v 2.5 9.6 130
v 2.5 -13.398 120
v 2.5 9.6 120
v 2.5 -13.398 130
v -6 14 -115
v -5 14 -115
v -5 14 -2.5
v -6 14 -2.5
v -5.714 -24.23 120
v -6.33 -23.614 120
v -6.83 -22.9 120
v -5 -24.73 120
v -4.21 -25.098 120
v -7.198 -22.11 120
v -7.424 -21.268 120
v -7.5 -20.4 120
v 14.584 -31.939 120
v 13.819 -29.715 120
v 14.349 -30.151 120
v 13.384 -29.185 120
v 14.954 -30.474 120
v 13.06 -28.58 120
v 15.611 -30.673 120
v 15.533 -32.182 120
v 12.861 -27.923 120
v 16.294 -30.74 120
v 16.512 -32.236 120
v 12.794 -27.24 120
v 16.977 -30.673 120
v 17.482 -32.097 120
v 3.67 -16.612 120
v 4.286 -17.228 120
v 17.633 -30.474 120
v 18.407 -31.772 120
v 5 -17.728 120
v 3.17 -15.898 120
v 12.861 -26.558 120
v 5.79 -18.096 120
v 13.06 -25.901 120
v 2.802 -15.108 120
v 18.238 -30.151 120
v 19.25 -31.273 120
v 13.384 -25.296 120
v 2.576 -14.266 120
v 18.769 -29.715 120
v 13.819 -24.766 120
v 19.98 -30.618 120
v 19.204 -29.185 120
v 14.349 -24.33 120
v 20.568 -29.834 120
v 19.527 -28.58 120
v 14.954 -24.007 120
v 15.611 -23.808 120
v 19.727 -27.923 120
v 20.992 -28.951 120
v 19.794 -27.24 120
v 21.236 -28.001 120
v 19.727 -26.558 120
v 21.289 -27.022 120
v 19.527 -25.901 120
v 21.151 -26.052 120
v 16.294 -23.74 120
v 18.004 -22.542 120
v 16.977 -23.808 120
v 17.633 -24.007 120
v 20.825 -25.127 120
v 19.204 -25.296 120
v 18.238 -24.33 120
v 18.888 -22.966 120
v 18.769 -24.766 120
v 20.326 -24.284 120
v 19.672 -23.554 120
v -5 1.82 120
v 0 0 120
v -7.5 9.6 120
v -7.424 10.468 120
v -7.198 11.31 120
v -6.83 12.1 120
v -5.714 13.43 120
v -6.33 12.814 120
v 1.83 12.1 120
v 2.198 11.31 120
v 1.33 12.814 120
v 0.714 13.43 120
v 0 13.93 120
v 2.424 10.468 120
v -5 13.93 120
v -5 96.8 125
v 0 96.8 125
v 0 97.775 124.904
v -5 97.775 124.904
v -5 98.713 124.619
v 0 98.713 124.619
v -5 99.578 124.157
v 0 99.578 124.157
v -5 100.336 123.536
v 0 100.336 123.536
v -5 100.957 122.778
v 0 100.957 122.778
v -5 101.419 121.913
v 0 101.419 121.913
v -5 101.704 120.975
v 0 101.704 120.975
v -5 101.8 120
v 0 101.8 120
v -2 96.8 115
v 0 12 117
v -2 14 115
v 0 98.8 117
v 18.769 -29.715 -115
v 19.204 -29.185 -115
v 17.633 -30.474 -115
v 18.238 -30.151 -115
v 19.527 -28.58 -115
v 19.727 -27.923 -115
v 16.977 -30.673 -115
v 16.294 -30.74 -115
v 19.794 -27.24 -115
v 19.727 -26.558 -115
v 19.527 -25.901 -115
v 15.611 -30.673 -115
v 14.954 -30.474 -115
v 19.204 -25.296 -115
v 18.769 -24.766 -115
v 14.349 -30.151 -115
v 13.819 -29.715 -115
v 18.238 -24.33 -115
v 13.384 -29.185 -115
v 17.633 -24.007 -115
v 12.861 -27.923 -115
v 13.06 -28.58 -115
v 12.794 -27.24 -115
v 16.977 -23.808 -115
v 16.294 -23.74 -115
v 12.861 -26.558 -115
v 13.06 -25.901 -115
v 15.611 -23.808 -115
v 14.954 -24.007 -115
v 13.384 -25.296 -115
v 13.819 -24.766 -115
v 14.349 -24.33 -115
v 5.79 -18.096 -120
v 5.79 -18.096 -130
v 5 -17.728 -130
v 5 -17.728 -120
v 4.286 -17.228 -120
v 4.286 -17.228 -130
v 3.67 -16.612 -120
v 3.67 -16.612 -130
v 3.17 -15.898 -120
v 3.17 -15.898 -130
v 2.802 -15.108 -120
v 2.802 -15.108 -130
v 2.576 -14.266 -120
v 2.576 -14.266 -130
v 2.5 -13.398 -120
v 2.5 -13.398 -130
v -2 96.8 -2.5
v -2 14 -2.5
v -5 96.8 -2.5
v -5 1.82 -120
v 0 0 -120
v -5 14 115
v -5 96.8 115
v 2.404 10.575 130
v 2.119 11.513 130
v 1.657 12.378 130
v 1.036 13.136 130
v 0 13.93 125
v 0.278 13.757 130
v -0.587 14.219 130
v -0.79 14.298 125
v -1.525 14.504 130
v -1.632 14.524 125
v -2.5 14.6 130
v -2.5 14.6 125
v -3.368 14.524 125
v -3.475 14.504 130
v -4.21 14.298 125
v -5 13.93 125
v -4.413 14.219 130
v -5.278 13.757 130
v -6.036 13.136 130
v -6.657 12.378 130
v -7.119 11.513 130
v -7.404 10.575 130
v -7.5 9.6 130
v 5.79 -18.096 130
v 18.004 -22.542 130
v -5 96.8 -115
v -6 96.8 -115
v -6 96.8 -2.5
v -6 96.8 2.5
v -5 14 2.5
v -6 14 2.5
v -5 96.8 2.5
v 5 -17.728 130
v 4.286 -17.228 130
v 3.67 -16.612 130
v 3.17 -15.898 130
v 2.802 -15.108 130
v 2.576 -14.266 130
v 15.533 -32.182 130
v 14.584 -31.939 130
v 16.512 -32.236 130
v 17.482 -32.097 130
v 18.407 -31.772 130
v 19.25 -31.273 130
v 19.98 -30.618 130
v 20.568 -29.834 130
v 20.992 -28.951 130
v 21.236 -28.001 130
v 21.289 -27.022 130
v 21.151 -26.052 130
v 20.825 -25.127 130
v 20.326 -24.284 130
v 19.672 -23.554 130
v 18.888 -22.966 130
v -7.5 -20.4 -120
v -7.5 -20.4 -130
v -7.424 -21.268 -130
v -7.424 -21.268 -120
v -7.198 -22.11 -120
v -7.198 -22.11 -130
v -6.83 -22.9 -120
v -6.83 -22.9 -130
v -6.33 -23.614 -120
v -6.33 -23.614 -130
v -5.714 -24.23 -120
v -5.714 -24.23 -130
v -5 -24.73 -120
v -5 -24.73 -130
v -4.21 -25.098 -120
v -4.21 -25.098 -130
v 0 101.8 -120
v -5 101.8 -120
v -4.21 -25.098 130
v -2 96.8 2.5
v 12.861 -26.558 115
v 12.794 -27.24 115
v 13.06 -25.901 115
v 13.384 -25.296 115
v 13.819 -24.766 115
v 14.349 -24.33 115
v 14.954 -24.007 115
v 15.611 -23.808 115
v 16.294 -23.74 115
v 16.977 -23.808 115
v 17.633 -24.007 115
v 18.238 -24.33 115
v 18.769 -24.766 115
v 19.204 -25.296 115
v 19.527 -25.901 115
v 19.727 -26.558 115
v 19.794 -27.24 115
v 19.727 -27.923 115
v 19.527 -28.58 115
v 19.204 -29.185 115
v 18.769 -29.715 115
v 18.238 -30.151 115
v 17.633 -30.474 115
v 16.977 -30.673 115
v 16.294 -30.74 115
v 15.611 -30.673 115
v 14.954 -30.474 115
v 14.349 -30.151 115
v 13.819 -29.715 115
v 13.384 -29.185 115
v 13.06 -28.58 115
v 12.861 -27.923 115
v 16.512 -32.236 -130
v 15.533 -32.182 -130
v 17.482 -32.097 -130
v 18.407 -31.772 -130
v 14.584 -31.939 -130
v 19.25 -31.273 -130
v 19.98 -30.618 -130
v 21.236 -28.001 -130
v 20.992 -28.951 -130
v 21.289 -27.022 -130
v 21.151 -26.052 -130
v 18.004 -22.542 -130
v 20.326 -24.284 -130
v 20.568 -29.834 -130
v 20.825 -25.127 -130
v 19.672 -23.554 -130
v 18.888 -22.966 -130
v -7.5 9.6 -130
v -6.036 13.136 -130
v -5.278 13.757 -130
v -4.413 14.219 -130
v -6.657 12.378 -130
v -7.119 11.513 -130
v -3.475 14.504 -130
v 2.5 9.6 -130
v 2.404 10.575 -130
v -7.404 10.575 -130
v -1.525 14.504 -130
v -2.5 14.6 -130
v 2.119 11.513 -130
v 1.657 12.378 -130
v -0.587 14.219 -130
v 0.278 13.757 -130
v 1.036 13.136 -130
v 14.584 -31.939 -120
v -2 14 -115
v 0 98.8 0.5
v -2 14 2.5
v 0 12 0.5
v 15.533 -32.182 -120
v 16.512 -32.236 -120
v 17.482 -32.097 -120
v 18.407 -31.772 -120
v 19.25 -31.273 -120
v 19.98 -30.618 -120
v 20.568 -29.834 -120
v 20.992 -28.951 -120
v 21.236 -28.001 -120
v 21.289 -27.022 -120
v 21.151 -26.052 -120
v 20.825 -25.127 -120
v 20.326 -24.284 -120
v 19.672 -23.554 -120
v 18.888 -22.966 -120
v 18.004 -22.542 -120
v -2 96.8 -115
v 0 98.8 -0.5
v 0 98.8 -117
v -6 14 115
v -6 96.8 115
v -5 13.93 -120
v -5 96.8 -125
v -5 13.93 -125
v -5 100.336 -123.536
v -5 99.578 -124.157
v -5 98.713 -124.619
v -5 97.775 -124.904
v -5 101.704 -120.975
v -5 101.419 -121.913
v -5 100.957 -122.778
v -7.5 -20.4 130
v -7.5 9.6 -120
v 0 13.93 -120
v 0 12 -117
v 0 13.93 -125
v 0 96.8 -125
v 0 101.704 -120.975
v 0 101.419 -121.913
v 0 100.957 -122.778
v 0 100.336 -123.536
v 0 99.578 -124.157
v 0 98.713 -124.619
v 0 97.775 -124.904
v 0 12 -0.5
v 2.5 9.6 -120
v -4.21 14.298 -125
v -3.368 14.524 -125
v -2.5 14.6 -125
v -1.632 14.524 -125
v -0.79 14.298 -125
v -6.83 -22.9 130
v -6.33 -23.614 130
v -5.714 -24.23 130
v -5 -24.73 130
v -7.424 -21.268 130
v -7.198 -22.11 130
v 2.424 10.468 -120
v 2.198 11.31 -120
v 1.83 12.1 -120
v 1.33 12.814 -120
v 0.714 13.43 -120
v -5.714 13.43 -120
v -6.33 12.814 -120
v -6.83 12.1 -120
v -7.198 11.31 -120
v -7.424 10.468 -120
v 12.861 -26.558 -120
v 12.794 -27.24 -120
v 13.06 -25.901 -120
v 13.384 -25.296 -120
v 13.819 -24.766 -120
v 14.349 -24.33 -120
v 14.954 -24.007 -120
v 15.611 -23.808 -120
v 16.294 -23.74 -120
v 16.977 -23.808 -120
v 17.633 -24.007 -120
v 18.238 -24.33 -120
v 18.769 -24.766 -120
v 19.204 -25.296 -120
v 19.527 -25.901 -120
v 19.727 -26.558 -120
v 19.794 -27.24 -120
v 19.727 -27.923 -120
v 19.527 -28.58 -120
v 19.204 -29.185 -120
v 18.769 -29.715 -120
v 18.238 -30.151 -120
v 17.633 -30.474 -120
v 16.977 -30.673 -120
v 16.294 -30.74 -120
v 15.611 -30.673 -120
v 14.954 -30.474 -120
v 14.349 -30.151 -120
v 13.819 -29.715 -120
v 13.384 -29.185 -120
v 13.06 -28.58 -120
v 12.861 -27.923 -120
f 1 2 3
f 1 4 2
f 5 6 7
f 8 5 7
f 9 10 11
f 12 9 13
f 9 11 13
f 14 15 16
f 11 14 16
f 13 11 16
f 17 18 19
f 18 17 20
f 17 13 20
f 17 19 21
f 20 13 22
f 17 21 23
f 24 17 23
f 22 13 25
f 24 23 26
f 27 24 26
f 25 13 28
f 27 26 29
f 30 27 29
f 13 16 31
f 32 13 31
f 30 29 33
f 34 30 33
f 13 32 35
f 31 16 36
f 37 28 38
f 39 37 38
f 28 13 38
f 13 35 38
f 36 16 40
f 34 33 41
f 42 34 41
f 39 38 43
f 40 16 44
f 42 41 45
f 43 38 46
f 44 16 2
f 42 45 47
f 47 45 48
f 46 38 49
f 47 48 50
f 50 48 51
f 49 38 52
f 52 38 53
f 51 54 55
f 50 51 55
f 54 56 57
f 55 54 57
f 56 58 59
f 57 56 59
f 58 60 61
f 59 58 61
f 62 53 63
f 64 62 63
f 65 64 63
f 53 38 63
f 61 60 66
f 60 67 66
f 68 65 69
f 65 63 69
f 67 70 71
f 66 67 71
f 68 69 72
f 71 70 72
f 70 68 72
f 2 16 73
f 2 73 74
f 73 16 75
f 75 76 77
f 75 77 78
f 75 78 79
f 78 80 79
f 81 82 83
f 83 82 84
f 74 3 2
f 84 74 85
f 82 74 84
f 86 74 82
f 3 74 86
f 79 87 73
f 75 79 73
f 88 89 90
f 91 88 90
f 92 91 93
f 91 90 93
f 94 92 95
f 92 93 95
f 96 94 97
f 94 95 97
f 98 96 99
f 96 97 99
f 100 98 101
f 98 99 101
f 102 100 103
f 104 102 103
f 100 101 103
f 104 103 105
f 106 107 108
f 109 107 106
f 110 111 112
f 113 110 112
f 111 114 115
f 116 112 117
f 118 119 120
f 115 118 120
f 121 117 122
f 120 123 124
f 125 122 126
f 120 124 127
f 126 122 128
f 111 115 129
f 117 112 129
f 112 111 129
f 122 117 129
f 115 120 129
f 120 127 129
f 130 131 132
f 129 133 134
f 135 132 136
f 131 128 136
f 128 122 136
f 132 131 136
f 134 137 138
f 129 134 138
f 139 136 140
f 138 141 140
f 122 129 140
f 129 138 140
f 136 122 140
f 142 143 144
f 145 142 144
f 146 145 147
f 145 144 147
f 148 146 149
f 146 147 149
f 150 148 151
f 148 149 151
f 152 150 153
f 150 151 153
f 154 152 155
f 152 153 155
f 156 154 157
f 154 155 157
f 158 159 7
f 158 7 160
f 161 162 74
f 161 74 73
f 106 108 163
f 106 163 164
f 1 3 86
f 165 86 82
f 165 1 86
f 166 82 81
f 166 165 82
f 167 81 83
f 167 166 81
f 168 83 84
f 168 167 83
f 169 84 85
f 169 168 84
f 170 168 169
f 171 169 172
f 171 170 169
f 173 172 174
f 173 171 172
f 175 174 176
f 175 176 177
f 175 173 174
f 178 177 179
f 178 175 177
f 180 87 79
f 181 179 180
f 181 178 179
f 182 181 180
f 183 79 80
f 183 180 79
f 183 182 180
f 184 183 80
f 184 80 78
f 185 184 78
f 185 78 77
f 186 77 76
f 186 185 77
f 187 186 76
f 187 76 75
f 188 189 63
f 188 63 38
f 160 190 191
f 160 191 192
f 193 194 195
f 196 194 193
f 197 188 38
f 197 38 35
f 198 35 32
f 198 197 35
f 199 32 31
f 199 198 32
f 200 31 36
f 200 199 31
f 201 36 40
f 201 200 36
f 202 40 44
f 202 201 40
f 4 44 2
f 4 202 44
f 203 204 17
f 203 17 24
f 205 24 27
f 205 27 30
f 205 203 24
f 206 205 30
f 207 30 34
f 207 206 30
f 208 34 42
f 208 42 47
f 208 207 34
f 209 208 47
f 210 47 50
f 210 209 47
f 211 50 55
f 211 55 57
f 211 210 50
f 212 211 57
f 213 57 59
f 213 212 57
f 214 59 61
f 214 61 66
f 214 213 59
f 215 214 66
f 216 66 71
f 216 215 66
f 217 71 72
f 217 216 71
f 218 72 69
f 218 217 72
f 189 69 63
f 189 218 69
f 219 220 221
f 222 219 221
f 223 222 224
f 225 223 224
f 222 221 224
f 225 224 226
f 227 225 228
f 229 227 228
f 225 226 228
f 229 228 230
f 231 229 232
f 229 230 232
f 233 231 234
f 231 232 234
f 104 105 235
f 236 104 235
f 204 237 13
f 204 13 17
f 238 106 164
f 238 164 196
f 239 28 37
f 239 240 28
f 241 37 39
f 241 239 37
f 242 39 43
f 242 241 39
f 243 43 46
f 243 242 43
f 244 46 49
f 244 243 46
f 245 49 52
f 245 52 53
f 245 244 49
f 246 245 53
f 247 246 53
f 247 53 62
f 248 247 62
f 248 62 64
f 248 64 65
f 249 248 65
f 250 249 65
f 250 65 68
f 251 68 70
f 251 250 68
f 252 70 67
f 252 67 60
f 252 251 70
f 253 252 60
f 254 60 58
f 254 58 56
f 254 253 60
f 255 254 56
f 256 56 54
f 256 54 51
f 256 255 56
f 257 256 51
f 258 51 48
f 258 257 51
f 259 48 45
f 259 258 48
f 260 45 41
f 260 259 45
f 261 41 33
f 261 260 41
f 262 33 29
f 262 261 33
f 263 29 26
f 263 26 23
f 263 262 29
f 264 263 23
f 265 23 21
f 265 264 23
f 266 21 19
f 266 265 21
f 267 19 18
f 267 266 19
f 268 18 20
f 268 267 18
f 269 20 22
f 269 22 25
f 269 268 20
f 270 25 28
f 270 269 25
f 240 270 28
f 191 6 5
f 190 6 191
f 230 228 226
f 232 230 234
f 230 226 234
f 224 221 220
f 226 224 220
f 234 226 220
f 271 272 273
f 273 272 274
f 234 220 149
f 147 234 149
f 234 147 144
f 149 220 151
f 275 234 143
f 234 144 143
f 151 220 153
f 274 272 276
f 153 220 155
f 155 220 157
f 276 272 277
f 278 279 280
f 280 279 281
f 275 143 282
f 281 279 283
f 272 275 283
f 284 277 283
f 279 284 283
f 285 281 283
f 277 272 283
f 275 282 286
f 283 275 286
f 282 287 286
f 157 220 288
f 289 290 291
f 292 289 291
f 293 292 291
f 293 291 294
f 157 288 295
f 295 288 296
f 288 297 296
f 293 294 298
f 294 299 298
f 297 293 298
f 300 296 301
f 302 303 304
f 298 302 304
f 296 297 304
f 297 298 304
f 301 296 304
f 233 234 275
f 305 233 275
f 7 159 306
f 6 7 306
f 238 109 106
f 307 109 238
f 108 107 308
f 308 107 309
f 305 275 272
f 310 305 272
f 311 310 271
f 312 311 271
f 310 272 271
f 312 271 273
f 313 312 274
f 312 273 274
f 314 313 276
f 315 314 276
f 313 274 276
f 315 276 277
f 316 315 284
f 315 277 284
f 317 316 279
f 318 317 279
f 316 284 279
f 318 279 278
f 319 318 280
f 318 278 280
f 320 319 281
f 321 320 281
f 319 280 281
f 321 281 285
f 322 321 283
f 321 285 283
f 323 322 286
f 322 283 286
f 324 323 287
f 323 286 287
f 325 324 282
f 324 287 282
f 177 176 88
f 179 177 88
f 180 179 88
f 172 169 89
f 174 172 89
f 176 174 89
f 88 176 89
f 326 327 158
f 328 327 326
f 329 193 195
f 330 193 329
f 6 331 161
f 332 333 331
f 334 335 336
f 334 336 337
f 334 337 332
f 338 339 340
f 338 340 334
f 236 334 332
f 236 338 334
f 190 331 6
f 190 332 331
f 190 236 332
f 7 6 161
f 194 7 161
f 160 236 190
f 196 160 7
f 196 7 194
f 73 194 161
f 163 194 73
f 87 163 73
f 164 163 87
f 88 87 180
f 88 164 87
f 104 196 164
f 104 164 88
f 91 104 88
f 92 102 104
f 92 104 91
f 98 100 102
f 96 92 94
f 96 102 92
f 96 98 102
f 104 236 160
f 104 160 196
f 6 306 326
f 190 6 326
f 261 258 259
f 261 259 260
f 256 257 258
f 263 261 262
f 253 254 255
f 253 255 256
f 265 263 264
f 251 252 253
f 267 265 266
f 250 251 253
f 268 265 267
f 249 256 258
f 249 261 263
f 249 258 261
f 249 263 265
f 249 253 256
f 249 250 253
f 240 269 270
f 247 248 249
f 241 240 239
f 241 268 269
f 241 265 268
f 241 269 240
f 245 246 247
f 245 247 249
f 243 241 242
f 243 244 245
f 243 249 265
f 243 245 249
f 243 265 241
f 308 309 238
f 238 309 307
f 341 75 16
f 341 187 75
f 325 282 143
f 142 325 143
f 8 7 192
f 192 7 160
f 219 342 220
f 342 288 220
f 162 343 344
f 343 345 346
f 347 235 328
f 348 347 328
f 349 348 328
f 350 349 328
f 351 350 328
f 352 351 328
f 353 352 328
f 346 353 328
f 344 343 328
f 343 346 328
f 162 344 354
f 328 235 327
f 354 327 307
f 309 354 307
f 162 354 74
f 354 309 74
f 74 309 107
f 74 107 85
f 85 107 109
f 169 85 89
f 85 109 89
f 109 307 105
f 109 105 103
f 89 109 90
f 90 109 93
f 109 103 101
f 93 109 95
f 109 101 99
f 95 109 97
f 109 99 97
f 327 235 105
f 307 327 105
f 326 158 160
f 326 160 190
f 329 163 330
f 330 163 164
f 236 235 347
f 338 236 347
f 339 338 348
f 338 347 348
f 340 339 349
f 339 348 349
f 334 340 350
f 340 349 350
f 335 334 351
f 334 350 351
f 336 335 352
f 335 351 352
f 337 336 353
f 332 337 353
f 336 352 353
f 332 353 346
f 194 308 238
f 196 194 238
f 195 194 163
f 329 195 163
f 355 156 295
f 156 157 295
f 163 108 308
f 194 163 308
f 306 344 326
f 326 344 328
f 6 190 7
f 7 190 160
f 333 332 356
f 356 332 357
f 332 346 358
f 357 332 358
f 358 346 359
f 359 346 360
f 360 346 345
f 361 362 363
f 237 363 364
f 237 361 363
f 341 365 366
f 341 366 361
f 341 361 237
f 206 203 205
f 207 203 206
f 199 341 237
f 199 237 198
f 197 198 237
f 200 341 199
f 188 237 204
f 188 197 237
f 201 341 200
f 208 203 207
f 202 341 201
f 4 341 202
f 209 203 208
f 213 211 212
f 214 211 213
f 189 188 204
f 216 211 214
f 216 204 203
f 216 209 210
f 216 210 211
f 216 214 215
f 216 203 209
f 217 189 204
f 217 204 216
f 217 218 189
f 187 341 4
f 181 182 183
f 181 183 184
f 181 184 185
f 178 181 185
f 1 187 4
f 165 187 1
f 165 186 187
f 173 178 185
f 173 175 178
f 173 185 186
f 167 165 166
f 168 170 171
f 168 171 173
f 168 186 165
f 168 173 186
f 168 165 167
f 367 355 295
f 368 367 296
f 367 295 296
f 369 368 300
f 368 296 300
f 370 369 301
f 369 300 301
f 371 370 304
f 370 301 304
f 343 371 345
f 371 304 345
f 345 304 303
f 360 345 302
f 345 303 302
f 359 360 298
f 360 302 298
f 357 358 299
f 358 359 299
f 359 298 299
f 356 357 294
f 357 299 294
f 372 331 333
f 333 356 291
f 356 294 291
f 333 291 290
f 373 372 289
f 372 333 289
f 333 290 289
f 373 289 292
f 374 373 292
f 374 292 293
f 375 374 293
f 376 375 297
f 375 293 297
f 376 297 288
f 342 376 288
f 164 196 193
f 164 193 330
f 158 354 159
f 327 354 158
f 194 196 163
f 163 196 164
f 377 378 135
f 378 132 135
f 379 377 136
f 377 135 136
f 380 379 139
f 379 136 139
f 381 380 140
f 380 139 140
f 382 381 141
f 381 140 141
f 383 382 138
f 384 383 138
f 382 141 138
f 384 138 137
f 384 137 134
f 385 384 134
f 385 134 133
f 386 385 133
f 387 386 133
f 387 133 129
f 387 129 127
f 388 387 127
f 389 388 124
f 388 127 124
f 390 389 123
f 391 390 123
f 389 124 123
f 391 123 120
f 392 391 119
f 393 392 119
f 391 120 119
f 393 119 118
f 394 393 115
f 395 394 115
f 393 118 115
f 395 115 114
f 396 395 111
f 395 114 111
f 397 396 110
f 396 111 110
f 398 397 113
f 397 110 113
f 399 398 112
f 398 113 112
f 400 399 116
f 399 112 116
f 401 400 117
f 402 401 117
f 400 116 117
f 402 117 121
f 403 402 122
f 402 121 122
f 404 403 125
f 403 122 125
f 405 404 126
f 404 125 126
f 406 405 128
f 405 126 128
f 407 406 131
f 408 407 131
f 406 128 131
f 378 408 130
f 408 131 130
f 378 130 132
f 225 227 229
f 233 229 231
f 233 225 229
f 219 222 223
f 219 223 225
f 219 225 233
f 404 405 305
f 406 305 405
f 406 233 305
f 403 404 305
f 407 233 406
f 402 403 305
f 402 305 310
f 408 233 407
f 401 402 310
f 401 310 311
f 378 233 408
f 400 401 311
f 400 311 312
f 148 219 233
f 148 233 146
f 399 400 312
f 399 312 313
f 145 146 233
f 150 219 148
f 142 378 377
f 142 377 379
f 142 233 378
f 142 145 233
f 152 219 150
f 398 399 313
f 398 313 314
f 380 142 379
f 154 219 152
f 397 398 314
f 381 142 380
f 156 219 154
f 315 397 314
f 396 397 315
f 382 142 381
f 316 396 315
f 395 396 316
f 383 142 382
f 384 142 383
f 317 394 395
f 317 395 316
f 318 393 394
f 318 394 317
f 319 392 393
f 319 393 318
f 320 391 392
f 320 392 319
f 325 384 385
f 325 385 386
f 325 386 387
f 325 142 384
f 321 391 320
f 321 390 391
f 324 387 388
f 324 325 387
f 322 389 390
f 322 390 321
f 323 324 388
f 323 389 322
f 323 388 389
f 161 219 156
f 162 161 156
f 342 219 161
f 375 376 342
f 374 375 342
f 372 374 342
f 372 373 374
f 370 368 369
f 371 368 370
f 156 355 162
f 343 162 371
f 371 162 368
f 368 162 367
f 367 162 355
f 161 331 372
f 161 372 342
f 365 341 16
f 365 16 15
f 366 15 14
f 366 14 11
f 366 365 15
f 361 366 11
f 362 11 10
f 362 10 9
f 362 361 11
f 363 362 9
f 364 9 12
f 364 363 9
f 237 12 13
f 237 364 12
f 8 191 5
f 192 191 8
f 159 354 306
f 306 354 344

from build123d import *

# Parameters (mm, degrees)
SKETCH2_W           = 112.5
SKETCH2_H           = 82.8
BOSS_EXTRUDE1_DEPTH = 5
CHAMFER1_SIZE       = 2
CUT_EXTRUDE1_DEPTH  = 270.978221344
BOSS_EXTRUDE2_DEPTH = 5
SKETCH5_R           = 3.5
BOSS_EXTRUDE3_DEPTH = 5
SKETCH7_W           = 112.5
SKETCH7_H           = 82.8
BOSS_EXTRUDE5_DEPTH = 1


with BuildPart() as part:
    # Sketch2 → Boss-Extrude1 (new body)
    with BuildSketch(Plane(origin=(0, 0, 0), x_dir=(0, 0, -1), z_dir=(1, 0, 0))):
        with BuildLine():
            Line((-120, 101.8), (120, 101.8))
            ThreePointArc((120, 101.8), (123.535533906, 100.335533906), (125, 96.8))
            Line((125, 96.8), (125, 0))
            Line((125, 0), (-125, 0))
            Line((-125, 0), (-125, 96.8))
            ThreePointArc((-125, 96.8), (-123.535533906, 100.335533906), (-120, 101.8))
        make_face()
        with Locations((58.75, 55.4)):
            Rectangle(SKETCH2_W, SKETCH2_H, mode=Mode.SUBTRACT)
        with Locations((-58.75, 55.4)):
            Rectangle(SKETCH2_W, SKETCH2_H, mode=Mode.SUBTRACT)
    extrude(amount=-BOSS_EXTRUDE1_DEPTH)

    # Chamfer1
    chamfer1_edges = [part.edges().sort_by_distance(p)[0] for p in [
        (0, 96.8, -58.75),
        (0, 55.4, -2.5),
        (0, 14, -58.75),
        (0, 55.4, -115),
        (0, 55.4, 115),
        (0, 14, 58.75),
        (0, 55.4, 2.5),
        (0, 96.8, 58.75),
    ]]
    chamfer(chamfer1_edges, length=CHAMFER1_SIZE)

    # Sketch3 → Cut-Extrude1 (cut, through all)
    with BuildSketch(Plane.XY.offset(125)):
        Polygon((-5, 1.819851171), (-5, 0), (0, 0), align=None)
    extrude(amount=-CUT_EXTRUDE1_DEPTH, mode=Mode.SUBTRACT)



with BuildPart() as body_2:
    # Sketch4 → Boss-Extrude2 (new, symmetric)
    with BuildSketch(Plane.XY.offset(125)):
        with BuildLine():
            Line((-7.5, 9.6), (-7.5, -20.4))
            ThreePointArc((-7.5, -20.4), (-6.595760221, -23.267882182), (-4.210100717, -25.098463104))
            Line((-4.210100717, -25.098463104), (14.583751699, -31.93886597))
            ThreePointArc((14.583751699, -31.93886597), (20.99231552, -28.950503583), (18.003953132, -22.541939763))
            Line((18.003953132, -22.541939763), (5.789899283, -18.096387722))
            ThreePointArc((5.789899283, -18.096387722), (3.404239779, -16.2658068), (2.5, -13.397924618))
            Line((2.5, -13.397924618), (2.5, 9.6))
            ThreePointArc((2.5, 9.6), (-2.5, 14.6), (-7.5, 9.6))
        make_face()
    extrude(amount=BOSS_EXTRUDE2_DEPTH, both=True)

    # Sketch5 → Boss-Extrude3 (add, symmetric)
    with BuildSketch(Plane(origin=(0, 0, 120), x_dir=(-1, 0, 0), z_dir=(0, 0, -1))):
        with Locations((-16.293852416, -27.240402867)):
            Circle(SKETCH5_R)
    extrude(amount=BOSS_EXTRUDE3_DEPTH, both=True)


with BuildPart() as body_3:
    # Mirror1: mirrored copy
    add(body_2.part.mirror(Plane.XY))


with BuildPart() as part_1:
    add(part.part)

    add(body_2.part)  # Boss-Extrude5 merges body 2

    add(body_3.part)  # Boss-Extrude5 merges body 3
    # Sketch7 → Boss-Extrude5 (add)
    with BuildSketch(Plane.ZY.offset(5)):
        with Locations((58.75, 55.4)):
            Rectangle(SKETCH7_W, SKETCH7_H)
        with Locations((-58.75, 55.4)):
            Rectangle(SKETCH7_W, SKETCH7_H)
    extrude(amount=BOSS_EXTRUDE5_DEPTH)


solid = part_1.part
